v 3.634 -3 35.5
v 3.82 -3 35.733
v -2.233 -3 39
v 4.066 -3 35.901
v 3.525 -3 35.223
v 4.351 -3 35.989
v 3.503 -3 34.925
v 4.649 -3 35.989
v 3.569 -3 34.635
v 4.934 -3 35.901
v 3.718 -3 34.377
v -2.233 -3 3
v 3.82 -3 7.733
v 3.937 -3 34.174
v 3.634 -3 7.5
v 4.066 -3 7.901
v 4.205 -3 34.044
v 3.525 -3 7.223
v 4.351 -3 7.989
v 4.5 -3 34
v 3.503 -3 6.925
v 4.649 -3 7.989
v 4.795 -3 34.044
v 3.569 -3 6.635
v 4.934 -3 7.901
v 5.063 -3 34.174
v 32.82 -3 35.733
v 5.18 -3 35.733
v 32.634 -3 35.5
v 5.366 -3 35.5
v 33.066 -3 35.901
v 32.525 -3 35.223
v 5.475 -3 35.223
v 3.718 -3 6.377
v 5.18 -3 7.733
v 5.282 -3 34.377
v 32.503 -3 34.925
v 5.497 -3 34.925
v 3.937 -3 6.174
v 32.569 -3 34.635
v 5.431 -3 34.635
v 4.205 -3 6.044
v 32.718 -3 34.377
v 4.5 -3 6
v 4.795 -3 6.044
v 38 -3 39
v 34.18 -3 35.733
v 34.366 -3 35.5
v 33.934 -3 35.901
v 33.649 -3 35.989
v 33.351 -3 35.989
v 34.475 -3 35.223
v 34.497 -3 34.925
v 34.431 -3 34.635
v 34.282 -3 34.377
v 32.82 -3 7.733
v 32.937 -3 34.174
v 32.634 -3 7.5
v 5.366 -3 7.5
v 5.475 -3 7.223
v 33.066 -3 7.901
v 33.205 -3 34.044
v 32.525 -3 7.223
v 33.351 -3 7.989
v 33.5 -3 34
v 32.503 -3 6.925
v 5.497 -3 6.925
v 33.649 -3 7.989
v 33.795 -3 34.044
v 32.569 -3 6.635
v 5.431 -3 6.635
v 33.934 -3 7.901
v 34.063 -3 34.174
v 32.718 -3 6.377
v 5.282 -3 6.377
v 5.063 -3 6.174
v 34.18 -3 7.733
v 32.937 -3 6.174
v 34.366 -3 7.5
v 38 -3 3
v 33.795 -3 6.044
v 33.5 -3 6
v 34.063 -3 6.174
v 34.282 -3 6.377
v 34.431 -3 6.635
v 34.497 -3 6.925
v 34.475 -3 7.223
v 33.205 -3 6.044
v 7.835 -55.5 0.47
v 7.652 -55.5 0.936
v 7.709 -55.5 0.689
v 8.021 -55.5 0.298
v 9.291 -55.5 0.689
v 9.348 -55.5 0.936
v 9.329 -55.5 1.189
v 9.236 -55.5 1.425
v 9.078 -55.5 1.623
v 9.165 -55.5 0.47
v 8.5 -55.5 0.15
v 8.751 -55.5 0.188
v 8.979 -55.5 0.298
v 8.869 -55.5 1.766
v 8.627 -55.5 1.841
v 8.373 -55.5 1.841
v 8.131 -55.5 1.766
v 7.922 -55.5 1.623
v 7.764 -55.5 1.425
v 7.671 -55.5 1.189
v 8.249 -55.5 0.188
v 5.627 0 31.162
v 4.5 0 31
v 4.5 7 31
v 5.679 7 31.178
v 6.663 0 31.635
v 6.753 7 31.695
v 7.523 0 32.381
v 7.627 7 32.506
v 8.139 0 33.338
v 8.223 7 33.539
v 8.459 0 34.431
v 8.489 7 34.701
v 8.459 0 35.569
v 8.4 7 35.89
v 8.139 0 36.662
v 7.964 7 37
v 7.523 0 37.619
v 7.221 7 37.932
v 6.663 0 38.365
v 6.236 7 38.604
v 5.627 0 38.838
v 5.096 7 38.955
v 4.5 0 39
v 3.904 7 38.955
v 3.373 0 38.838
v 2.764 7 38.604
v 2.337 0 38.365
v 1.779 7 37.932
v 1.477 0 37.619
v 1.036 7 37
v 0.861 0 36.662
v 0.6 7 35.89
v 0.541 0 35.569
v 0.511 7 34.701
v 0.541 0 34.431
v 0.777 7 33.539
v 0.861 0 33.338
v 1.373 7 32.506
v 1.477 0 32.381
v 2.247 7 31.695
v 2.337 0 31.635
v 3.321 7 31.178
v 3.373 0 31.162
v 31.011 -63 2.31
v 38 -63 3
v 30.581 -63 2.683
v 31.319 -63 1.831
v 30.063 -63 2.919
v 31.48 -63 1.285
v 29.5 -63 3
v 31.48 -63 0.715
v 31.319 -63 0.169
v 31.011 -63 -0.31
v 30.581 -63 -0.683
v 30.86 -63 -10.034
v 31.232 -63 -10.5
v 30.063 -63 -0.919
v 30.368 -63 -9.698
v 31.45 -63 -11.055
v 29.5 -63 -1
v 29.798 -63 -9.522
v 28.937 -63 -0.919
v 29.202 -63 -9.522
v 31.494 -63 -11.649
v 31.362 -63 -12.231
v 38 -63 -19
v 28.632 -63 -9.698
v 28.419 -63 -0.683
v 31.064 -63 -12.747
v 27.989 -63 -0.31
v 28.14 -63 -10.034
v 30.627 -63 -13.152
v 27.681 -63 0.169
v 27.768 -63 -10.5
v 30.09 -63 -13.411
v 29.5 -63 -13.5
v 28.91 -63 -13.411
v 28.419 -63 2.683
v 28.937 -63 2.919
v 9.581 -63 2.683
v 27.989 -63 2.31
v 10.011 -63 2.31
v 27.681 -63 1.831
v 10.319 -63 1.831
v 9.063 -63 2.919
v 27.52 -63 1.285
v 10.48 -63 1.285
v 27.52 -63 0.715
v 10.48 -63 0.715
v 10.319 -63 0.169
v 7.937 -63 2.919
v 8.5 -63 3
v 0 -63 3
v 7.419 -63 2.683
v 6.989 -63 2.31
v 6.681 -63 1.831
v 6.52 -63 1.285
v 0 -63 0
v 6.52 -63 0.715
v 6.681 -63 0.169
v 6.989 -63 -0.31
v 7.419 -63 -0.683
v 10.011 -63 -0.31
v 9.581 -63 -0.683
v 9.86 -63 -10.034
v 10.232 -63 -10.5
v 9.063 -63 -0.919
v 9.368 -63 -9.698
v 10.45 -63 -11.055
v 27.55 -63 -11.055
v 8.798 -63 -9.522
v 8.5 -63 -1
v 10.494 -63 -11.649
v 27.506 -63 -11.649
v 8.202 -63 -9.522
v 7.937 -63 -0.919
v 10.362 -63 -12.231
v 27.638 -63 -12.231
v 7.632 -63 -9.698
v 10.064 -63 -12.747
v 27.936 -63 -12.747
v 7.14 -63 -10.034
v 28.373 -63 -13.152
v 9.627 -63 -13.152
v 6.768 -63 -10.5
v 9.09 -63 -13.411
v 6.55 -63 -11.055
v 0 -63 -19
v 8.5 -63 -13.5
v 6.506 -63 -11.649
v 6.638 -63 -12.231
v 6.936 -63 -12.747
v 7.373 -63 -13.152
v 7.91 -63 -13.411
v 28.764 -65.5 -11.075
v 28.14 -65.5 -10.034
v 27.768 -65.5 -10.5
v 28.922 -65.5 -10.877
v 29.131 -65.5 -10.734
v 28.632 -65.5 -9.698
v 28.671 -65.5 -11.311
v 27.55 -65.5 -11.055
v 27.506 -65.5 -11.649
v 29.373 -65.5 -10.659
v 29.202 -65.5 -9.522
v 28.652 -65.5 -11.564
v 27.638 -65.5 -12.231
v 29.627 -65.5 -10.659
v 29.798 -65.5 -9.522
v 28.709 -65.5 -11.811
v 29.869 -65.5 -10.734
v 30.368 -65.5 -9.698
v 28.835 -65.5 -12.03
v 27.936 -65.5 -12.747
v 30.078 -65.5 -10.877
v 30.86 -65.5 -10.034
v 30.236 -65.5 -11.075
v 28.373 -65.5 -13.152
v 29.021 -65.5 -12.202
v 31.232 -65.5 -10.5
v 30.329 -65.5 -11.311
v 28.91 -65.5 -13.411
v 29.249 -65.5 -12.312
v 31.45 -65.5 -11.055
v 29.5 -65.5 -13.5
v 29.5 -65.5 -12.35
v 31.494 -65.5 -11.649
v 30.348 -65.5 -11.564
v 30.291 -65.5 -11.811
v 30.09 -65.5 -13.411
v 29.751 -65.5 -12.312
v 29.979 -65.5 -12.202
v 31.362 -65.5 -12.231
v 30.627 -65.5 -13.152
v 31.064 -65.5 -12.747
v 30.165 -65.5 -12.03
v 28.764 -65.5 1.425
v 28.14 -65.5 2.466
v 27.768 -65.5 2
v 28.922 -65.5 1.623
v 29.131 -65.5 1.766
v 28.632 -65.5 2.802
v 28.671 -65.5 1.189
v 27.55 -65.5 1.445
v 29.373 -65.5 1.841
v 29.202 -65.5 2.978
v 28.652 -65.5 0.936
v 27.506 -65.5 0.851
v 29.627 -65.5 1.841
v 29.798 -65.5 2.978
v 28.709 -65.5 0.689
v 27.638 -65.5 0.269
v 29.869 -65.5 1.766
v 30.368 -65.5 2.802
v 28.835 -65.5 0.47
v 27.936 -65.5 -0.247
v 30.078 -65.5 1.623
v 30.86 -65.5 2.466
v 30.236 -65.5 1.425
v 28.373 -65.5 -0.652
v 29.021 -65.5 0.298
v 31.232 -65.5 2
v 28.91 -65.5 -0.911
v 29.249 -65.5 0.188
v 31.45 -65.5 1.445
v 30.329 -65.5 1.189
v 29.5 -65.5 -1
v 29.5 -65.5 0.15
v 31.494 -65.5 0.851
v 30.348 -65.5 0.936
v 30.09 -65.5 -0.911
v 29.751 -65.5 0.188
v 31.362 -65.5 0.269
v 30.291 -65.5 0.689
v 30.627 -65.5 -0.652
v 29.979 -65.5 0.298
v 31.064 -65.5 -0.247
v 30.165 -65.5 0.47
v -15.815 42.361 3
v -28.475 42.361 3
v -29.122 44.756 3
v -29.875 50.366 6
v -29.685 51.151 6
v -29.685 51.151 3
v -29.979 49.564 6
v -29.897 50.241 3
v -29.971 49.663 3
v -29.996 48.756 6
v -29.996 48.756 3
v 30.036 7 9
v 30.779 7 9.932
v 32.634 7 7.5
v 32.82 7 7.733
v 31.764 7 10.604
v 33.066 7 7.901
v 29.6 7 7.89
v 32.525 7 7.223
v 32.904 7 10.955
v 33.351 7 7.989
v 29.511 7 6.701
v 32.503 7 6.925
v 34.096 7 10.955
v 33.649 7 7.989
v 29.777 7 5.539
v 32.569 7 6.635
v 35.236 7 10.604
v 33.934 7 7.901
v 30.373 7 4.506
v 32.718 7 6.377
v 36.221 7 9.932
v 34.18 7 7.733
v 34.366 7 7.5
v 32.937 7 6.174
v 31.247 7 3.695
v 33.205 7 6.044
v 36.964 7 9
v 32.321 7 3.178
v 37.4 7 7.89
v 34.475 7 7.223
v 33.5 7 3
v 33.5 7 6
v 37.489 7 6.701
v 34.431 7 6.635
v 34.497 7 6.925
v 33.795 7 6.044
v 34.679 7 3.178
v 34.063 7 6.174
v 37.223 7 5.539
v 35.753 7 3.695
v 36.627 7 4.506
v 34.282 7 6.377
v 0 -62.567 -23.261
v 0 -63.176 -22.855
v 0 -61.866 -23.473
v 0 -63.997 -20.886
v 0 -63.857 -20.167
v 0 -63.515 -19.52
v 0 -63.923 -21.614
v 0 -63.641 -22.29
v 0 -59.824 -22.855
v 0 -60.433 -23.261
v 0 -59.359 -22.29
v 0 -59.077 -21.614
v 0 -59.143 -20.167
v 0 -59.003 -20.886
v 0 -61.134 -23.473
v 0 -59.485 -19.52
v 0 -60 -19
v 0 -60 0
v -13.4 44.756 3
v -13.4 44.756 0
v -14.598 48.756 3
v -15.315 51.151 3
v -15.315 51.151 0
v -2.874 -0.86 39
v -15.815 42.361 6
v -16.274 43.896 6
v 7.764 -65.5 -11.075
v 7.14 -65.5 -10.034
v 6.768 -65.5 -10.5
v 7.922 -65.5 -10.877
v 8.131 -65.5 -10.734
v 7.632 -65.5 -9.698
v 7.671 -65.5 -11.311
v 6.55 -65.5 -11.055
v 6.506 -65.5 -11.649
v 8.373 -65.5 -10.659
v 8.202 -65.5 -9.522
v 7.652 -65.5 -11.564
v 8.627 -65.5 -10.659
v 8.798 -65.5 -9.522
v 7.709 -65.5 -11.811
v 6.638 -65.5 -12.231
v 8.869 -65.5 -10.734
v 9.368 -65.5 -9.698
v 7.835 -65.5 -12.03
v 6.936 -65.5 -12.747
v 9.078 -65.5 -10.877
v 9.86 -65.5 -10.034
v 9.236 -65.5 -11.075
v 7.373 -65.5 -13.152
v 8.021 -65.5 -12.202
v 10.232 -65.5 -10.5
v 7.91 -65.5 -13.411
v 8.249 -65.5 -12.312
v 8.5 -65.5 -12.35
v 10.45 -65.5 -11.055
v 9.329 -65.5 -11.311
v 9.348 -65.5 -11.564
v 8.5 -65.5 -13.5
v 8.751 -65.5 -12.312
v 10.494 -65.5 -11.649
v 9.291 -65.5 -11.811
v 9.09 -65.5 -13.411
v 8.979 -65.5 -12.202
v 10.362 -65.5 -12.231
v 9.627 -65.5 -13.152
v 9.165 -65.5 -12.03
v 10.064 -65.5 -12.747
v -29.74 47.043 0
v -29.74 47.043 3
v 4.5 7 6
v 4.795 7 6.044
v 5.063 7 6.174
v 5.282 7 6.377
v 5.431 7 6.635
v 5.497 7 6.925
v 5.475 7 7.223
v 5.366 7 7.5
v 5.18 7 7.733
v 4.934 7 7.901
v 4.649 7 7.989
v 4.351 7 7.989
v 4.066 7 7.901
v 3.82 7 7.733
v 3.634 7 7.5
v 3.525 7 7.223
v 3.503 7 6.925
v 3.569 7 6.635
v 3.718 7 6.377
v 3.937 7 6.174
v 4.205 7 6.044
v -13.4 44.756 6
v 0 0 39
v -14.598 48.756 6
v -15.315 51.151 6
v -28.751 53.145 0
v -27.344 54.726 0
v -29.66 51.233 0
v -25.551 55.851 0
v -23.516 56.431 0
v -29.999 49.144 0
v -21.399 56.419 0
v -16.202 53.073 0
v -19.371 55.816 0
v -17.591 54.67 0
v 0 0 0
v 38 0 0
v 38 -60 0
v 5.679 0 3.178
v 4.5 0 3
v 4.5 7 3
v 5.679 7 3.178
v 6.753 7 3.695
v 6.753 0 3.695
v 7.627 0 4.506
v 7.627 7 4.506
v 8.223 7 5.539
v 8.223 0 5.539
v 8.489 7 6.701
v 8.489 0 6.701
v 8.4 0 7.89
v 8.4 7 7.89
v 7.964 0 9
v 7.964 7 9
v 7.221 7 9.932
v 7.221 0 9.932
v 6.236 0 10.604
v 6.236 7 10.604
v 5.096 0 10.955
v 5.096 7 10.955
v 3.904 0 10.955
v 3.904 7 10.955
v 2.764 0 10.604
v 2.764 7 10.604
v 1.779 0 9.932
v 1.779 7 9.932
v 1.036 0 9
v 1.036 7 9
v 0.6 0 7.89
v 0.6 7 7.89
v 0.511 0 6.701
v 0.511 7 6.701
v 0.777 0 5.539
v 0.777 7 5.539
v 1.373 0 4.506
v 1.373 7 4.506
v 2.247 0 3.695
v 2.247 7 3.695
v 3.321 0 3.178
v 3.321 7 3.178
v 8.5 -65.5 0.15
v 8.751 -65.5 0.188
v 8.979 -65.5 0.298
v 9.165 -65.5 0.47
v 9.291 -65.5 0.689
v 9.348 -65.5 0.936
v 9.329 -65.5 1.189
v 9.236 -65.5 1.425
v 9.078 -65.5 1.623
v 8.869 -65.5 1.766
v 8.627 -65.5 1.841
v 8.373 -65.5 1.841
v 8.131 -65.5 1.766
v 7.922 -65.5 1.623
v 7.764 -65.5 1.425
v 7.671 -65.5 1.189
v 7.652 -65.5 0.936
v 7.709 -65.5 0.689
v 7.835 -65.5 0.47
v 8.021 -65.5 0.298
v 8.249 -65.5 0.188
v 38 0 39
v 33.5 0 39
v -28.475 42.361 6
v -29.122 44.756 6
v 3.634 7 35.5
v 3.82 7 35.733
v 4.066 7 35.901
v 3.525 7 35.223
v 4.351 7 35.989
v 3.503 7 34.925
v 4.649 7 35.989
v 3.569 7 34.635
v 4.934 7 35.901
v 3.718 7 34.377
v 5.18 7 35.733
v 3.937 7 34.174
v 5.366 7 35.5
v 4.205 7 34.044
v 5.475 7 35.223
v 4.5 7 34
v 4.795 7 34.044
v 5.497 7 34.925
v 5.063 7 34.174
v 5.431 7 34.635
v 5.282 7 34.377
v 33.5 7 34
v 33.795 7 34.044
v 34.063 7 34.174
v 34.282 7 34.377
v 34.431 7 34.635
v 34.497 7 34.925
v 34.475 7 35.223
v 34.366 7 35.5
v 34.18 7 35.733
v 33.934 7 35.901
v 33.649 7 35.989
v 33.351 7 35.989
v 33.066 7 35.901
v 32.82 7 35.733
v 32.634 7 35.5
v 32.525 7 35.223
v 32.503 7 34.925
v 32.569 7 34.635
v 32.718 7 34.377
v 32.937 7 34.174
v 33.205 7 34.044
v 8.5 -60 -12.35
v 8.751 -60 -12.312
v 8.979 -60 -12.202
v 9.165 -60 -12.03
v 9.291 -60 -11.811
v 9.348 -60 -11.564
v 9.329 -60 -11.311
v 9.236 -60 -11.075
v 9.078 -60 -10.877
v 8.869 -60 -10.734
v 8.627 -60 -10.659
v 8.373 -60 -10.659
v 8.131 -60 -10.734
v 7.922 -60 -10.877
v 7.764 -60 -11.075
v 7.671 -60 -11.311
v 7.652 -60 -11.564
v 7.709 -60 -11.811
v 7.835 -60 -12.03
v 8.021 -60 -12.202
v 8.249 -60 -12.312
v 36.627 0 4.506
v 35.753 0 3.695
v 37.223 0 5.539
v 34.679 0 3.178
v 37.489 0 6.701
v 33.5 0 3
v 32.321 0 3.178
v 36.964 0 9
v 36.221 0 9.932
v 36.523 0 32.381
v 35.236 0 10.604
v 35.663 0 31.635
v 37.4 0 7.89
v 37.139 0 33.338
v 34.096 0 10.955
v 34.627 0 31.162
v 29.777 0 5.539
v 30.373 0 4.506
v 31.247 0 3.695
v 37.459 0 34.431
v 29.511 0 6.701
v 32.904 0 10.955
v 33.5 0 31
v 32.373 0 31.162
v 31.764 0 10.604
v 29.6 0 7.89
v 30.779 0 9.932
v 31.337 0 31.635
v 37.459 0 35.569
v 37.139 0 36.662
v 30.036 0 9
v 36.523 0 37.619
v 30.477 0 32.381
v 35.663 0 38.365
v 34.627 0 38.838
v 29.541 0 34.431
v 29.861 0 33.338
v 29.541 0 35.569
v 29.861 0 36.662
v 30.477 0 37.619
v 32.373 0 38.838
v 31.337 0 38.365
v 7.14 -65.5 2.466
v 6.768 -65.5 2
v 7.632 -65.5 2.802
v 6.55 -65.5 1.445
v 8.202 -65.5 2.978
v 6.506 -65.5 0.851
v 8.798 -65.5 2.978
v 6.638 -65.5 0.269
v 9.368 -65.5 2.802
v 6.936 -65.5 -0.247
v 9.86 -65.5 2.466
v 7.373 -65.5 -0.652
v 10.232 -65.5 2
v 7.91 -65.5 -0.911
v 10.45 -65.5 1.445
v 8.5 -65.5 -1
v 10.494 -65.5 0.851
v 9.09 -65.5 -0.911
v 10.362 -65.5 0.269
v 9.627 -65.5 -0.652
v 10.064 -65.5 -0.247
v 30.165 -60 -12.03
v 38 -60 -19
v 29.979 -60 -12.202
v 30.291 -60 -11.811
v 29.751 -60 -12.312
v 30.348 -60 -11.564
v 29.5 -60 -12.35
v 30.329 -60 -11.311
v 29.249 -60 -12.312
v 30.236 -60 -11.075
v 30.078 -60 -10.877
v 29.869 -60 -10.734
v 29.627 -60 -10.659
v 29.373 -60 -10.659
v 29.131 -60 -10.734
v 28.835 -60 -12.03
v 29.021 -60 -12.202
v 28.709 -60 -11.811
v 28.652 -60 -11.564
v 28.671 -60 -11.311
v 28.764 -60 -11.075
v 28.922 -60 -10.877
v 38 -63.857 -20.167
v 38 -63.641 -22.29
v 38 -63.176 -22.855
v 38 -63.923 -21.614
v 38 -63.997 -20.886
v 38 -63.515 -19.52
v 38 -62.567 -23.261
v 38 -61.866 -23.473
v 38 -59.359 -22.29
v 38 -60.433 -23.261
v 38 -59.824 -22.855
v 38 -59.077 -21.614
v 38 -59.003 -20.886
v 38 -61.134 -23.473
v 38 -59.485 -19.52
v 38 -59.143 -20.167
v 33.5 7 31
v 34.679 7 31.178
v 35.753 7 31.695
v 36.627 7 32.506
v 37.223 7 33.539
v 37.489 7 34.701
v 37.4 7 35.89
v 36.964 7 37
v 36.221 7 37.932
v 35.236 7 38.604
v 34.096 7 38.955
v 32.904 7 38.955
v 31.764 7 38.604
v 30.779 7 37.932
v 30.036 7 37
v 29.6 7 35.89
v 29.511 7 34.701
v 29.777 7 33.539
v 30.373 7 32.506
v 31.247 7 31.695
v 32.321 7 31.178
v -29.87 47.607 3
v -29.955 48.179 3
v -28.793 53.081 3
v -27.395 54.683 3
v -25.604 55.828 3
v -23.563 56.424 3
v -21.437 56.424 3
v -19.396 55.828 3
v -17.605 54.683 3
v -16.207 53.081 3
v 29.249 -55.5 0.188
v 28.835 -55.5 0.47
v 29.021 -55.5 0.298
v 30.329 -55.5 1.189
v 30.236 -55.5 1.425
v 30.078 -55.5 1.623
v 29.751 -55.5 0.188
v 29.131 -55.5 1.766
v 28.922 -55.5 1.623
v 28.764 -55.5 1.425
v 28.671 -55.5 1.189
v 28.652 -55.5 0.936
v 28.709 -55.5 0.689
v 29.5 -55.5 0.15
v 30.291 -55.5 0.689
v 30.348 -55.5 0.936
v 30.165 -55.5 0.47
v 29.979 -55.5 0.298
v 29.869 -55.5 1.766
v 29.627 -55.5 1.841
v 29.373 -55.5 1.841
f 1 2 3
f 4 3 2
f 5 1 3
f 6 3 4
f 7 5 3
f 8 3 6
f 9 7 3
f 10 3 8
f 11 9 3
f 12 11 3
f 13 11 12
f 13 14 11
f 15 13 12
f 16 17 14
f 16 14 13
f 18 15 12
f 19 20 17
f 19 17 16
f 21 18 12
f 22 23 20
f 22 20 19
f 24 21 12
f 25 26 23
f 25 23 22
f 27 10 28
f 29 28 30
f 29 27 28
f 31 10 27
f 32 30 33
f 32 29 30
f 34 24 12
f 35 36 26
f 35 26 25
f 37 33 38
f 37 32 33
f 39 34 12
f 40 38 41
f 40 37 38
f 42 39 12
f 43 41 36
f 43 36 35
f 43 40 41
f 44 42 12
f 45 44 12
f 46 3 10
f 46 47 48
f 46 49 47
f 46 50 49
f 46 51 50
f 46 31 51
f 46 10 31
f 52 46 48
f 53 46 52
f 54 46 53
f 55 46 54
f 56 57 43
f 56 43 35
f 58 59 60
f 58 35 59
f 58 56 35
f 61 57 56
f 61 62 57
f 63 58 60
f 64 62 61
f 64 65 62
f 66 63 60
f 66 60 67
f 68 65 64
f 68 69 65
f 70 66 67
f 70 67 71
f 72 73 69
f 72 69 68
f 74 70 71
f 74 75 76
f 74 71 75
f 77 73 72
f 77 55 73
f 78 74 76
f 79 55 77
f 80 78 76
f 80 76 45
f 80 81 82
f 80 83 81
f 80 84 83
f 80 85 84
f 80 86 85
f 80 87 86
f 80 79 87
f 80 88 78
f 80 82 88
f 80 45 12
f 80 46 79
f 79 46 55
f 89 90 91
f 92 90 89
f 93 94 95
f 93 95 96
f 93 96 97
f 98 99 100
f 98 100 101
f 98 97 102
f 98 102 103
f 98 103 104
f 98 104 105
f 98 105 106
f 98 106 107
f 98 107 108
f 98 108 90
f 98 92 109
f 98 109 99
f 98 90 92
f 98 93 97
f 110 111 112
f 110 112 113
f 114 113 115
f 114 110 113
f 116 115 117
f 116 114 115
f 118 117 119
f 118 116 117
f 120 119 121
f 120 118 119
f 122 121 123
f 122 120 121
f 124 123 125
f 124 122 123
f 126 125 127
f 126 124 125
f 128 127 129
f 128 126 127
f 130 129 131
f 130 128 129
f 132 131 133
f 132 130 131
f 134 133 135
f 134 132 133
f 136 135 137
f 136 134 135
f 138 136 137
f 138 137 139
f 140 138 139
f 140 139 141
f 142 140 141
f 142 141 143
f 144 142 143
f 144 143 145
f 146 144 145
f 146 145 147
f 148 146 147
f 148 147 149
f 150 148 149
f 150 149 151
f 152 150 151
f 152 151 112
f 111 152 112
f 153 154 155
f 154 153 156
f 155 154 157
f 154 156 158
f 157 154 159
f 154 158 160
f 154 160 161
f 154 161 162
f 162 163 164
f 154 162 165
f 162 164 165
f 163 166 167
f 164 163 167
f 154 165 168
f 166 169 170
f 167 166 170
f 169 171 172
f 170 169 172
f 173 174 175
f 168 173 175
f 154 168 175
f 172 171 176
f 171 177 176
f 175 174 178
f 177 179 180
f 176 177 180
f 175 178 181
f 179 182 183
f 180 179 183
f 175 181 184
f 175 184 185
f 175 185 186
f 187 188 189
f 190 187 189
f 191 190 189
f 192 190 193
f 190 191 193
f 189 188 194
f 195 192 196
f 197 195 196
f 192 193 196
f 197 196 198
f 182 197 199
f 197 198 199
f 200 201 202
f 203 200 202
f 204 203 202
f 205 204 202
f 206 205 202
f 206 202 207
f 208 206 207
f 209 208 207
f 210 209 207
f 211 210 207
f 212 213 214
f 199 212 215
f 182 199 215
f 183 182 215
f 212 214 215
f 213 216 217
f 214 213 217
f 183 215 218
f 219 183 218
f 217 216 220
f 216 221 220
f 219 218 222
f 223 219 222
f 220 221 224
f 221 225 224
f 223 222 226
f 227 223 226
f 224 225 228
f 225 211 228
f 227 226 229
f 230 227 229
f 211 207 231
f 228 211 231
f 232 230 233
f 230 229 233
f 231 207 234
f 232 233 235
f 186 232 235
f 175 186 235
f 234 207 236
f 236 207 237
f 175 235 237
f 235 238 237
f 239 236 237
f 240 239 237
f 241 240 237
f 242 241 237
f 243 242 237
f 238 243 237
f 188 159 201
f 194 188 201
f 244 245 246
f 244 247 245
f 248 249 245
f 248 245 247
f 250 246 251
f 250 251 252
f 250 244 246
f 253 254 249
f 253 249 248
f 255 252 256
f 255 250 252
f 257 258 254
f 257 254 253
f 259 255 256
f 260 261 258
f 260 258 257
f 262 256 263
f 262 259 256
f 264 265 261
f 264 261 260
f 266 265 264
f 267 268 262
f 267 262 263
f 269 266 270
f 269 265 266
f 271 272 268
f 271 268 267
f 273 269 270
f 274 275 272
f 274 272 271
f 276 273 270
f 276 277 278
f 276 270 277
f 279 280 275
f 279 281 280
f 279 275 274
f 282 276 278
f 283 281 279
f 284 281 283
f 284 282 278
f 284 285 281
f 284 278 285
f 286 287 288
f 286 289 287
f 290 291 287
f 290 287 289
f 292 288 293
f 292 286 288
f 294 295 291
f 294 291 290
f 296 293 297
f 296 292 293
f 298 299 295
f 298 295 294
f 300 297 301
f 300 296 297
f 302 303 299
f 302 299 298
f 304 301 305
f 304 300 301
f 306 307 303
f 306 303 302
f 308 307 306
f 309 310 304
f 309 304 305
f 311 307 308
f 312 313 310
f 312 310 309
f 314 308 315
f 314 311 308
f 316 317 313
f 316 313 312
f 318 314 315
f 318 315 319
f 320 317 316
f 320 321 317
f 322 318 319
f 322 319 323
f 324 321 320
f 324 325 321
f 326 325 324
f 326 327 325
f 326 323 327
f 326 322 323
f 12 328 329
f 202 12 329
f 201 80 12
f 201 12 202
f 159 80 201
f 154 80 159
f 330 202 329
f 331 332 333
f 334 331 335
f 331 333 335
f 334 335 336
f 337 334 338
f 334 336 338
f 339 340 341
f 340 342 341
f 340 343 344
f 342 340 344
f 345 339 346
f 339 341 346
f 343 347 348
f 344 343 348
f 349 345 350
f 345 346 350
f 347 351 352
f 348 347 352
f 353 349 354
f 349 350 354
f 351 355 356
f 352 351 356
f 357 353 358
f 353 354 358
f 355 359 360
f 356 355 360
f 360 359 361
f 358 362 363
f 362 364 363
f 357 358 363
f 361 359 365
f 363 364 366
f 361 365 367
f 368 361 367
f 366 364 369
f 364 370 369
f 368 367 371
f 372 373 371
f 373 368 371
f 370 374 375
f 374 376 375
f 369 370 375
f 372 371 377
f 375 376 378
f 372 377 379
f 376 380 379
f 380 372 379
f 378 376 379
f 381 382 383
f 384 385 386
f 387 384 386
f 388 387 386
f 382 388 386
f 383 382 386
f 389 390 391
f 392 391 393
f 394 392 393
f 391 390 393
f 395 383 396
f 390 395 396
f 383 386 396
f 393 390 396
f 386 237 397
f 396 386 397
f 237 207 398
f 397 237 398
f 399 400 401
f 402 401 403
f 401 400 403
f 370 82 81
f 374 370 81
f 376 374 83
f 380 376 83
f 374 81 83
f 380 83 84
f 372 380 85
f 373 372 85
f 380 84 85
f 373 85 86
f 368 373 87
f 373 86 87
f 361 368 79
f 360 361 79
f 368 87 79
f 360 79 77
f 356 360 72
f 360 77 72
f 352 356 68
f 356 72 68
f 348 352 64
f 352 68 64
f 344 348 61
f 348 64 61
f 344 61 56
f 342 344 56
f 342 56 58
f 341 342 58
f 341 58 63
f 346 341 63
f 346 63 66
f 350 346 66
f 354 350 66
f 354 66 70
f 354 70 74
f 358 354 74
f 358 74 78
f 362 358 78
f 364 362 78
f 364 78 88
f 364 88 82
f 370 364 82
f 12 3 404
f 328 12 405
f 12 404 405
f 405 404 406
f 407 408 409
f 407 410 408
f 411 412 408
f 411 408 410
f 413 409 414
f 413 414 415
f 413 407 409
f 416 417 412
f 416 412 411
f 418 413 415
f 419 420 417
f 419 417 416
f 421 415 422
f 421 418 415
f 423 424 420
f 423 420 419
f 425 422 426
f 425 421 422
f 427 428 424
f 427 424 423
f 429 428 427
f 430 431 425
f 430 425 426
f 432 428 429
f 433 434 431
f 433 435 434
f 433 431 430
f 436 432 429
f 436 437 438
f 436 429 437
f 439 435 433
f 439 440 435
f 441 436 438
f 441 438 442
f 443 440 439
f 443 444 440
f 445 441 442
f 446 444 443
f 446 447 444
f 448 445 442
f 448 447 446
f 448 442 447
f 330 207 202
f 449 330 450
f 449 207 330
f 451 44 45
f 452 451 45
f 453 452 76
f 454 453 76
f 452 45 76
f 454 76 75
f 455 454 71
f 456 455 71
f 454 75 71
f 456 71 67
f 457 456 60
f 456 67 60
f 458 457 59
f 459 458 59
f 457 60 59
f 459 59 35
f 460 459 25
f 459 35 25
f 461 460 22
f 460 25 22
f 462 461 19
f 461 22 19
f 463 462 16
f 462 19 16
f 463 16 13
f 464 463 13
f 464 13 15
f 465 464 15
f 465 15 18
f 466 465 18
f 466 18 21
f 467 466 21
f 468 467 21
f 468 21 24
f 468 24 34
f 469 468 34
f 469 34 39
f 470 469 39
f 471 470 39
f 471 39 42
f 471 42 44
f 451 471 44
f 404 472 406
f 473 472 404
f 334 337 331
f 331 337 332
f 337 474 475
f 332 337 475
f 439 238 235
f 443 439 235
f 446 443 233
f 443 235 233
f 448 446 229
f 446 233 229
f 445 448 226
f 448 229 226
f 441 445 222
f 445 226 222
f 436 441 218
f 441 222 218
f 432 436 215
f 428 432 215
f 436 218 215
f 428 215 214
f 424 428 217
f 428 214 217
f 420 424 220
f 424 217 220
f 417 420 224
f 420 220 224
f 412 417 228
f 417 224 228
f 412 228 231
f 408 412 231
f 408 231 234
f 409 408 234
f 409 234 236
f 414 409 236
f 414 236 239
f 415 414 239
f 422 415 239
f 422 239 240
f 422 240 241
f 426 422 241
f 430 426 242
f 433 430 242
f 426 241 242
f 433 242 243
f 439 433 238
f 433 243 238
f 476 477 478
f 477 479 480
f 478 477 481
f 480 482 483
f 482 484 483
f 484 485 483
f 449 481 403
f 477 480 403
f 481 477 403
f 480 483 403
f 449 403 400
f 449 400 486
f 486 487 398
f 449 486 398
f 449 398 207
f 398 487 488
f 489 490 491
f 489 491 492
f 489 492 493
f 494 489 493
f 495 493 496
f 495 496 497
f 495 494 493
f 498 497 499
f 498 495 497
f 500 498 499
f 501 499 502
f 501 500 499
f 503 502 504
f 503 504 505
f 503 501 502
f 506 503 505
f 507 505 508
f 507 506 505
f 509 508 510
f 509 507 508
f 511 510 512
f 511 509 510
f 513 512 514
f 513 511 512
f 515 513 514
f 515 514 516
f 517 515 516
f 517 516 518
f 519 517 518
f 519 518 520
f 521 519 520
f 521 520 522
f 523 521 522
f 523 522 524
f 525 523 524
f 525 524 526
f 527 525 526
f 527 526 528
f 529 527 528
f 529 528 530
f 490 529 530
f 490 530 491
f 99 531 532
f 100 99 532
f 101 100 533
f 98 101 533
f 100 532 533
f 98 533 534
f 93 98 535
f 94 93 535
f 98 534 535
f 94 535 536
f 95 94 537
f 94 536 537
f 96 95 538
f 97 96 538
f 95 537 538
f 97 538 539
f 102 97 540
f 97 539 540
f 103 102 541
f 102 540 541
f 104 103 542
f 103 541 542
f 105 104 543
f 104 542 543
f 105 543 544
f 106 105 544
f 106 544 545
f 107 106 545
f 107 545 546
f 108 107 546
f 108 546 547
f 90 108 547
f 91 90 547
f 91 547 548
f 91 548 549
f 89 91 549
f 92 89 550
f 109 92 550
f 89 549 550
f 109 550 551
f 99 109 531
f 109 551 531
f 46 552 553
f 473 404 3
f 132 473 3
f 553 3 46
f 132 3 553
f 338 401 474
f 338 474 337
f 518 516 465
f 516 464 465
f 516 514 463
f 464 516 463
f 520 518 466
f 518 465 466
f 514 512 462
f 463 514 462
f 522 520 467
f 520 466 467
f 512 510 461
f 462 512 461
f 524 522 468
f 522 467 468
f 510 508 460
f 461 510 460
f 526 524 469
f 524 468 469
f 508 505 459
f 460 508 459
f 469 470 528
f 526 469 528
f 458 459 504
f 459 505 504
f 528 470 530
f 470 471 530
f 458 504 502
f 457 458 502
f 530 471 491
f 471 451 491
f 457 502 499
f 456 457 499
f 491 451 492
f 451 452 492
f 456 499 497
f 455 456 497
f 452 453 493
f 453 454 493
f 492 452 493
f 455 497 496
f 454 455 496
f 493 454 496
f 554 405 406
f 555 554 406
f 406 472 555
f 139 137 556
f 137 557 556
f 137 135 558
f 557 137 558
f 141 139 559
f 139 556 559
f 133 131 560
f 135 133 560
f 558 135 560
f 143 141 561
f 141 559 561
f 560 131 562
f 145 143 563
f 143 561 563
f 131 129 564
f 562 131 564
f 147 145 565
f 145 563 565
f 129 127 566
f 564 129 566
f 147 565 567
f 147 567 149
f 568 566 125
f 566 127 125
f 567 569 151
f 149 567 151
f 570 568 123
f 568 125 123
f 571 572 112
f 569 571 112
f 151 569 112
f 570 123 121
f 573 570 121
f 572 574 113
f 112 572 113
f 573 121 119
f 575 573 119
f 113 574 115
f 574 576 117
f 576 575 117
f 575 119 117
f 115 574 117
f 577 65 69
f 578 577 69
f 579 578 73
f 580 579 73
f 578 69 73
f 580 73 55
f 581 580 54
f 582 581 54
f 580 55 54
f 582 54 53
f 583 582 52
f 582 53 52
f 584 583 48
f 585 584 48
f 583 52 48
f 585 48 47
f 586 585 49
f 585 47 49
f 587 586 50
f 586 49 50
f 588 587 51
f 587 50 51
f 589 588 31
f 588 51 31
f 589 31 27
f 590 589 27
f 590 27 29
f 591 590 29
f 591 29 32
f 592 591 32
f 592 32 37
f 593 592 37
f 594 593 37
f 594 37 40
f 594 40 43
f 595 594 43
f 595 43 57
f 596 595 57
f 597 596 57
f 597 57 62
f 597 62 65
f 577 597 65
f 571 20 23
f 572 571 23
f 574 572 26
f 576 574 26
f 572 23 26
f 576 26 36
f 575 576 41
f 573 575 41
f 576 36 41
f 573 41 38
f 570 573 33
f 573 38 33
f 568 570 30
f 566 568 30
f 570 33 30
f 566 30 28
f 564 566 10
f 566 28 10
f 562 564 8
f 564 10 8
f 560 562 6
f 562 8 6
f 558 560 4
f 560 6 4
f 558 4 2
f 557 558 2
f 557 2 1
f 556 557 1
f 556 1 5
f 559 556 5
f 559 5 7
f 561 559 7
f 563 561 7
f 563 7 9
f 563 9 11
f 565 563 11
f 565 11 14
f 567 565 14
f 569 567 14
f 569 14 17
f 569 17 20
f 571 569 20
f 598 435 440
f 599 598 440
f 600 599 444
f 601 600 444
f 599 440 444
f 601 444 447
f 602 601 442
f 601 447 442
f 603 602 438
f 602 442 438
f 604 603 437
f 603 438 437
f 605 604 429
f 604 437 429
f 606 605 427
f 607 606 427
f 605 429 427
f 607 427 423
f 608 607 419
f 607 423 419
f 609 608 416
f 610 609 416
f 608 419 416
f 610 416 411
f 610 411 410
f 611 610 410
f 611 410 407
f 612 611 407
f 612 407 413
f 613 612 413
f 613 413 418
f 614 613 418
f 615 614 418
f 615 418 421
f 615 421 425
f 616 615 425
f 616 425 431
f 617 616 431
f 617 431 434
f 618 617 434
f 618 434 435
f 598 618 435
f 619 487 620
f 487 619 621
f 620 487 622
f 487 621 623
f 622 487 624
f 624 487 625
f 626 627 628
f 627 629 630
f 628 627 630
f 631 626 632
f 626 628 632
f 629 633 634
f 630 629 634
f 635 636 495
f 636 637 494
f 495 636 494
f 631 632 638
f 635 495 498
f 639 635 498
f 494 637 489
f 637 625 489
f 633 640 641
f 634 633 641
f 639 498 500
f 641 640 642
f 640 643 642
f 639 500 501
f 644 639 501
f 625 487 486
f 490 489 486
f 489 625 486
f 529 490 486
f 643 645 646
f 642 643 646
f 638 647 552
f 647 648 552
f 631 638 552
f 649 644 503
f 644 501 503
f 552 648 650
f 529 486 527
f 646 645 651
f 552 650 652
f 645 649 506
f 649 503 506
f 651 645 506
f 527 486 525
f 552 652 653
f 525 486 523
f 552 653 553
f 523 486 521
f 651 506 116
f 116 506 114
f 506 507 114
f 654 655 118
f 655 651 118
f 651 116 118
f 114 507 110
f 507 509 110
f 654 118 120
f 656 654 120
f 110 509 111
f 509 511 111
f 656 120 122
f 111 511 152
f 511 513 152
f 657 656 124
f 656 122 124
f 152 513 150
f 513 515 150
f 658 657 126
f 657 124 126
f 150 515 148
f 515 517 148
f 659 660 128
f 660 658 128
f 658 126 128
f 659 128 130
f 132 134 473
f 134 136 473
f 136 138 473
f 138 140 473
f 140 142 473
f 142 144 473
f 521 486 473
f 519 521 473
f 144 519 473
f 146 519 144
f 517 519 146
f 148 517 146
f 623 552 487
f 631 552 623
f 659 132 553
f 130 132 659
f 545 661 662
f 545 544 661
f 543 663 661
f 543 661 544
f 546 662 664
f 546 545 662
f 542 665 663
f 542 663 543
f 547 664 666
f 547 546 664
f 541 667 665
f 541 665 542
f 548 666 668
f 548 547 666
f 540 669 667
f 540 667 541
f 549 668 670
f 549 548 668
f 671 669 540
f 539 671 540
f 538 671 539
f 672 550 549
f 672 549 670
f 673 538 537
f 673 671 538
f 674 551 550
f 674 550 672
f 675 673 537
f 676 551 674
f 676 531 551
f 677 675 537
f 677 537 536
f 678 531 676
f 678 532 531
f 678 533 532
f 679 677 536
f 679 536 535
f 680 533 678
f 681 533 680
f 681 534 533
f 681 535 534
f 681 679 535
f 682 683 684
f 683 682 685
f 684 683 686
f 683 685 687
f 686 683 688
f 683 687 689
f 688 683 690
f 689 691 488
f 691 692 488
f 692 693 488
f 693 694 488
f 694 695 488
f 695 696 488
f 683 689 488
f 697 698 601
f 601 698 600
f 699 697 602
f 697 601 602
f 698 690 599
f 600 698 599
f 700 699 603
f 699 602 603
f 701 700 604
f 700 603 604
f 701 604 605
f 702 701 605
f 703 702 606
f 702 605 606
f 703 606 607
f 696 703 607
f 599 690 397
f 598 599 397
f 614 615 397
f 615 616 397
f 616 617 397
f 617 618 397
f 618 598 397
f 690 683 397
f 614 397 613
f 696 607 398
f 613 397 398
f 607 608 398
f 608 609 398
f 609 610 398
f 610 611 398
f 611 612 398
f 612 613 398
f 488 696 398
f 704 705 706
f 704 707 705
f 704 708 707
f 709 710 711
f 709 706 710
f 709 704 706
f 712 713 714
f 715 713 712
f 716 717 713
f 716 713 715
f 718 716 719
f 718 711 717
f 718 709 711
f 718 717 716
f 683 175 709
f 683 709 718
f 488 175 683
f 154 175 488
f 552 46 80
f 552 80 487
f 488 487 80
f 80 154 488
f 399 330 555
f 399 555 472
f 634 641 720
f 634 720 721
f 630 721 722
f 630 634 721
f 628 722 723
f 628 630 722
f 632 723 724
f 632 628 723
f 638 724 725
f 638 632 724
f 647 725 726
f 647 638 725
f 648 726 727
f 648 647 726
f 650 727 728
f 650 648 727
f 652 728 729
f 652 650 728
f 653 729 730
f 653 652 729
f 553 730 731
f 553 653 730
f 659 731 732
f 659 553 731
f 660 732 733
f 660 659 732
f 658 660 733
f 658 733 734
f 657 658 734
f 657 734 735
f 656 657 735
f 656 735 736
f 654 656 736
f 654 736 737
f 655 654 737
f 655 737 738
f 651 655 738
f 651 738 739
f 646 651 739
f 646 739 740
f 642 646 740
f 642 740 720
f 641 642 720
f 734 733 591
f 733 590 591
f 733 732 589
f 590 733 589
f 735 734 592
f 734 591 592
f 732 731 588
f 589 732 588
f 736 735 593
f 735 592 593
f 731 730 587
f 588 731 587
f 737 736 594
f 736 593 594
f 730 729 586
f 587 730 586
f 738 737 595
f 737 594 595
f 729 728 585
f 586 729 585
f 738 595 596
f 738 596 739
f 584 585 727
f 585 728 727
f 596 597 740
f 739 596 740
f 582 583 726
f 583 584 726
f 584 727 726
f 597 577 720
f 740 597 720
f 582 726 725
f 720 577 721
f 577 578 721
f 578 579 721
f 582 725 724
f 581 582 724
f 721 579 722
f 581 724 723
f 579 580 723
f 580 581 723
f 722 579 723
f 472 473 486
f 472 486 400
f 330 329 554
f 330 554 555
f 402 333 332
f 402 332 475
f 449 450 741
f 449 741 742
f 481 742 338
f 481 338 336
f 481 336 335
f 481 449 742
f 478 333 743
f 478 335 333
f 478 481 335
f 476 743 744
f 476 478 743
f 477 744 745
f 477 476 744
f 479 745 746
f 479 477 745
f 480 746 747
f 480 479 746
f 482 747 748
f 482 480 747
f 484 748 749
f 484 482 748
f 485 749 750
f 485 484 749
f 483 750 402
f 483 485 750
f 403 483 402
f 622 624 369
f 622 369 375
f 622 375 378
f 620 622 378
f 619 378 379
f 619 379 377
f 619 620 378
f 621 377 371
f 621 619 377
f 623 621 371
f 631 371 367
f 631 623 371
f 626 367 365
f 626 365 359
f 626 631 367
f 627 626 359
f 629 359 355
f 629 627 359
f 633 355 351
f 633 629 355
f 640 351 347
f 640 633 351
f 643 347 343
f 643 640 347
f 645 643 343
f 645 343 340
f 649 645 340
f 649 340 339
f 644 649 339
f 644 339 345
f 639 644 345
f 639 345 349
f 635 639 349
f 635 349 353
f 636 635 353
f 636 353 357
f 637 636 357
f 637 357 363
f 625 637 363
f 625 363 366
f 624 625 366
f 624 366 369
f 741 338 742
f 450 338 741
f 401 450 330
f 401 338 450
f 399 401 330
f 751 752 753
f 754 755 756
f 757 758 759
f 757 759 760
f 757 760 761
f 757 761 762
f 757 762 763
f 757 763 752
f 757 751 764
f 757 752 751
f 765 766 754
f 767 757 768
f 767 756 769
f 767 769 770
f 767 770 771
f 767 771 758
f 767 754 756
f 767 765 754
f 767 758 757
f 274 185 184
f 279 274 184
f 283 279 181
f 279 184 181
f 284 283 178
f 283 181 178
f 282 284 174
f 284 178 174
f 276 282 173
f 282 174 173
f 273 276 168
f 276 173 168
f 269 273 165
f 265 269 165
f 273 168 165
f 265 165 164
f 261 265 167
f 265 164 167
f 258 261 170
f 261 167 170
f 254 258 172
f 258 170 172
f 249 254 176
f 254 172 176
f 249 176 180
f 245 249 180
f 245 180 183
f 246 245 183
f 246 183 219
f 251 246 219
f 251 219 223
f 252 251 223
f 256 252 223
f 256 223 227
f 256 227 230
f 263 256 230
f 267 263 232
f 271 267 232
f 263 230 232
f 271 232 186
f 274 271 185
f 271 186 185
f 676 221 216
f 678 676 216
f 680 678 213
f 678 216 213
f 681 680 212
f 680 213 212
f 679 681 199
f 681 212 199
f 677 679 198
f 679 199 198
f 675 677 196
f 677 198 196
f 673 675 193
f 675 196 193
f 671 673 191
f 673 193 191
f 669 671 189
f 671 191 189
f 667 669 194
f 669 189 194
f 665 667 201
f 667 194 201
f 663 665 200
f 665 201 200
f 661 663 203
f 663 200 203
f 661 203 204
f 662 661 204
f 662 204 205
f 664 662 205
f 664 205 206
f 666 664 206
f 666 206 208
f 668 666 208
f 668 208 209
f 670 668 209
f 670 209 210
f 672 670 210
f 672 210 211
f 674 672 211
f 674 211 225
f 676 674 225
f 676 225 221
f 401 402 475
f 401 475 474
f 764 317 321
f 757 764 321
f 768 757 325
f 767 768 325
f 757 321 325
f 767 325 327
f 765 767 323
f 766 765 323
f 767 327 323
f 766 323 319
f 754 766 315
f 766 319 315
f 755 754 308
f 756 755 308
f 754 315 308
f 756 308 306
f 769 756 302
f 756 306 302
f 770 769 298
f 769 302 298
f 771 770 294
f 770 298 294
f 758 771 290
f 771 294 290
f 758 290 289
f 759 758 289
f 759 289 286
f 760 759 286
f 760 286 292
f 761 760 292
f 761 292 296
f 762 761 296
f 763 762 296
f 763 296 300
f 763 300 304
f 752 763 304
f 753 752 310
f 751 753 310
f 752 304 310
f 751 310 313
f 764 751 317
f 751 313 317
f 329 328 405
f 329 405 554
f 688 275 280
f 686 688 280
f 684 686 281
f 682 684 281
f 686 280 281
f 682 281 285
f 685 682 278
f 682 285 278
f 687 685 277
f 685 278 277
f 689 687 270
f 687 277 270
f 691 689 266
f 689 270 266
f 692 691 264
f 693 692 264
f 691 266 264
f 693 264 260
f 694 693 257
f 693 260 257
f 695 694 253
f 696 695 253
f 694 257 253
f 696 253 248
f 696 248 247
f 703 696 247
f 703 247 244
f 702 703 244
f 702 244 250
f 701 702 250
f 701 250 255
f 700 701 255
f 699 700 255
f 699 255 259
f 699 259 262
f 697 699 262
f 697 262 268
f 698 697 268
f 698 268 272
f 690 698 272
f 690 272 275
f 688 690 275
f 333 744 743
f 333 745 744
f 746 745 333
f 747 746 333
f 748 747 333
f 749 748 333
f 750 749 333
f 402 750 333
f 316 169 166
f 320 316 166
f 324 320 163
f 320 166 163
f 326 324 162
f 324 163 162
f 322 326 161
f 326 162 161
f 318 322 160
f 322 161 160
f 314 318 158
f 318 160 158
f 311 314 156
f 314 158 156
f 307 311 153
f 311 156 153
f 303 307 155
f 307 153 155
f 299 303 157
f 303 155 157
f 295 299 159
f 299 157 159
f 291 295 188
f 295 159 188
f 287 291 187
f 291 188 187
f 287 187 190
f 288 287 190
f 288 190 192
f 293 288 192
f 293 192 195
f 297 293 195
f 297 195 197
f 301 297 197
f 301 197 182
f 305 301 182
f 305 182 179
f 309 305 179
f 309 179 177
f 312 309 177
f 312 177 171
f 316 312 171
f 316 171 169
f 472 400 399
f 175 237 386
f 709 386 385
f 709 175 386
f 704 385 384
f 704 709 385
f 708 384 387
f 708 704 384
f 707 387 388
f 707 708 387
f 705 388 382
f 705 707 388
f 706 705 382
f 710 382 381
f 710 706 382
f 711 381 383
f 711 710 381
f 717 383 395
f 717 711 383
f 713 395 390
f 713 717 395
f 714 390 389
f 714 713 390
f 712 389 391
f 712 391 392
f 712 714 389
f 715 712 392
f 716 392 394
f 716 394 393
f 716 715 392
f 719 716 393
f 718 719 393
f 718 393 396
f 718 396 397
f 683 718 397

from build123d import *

# Parameters (mm, degrees)
PAD_DEPTH       = 38
SKETCH001_R     = 2.5
PAD001_DEPTH    = 38
SKETCH002_R     = 2
PAD002_DEPTH    = 2.5
SKETCH003_R     = 0.85
POCKET_DEPTH    = 10
SKETCH004_R     = 4
PAD003_DEPTH    = 10
SKETCH005_R     = 1
POCKET001_DEPTH = 10.001
PAD004_DEPTH    = 3
PAD005_DEPTH    = 3
PAD006_DEPTH    = 3
SKETCH009_W     = 60
SKETCH009_H     = 36
POCKET002_DEPTH = 68.001


with BuildPart() as part:
    # Sketch → Pad (new body)
    with BuildSketch(Plane.YZ):
        Polygon((-63, 3), (-63, -23), (-60, -23), (-60, 0), (0, 0), (0, 39), (-3, 39), (-3, 3), align=None)
    extrude(amount=PAD_DEPTH)

    # Sketch001 (on Face10 of Pad) → Pad001 (new body)
    with BuildSketch(Plane.YZ.offset(38)):
        with Locations((-61.5, -21)):
            Circle(SKETCH001_R)
    extrude(amount=-PAD001_DEPTH)

    # Sketch002 (on Face3 of Pad001) → Pad002 (new body)
    with BuildSketch(Plane(origin=(0, -63, 0), x_dir=(0, 0, -1), z_dir=(0, -1, 0))):
        with Locations((-1, 29.5)):
            Circle(SKETCH002_R)
        with Locations((-1, 8.5)):
            Circle(SKETCH002_R)
        with Locations((11.5, 8.5)):
            Circle(SKETCH002_R)
        with Locations((11.5, 29.5)):
            Circle(SKETCH002_R)
    extrude(amount=PAD002_DEPTH)

    # Sketch003 (on Face25 of Pad002) → Pocket (cut)
    with BuildSketch(Plane(origin=(0, -65.5, 0), x_dir=(0, 0, -1), z_dir=(0, -1, 0))):
        with Locations((11.5, 29.5)):
            Circle(SKETCH003_R)
        with Locations((11.5, 8.5)):
            Circle(SKETCH003_R)
        with Locations((-1, 29.5)):
            Circle(SKETCH003_R)
        with Locations((-1, 8.5)):
            Circle(SKETCH003_R)
    extrude(amount=-POCKET_DEPTH, mode=Mode.SUBTRACT)

    # Sketch004 (on Face1 of Pocket) → Pad003 (new body)
    with BuildSketch(Plane(origin=(0, -3, 0), x_dir=(0, 0, -1), z_dir=(0, -1, 0))):
        with Locations((-7, 33.5)):
            Circle(SKETCH004_R)
        with Locations((-7, 4.5)):
            Circle(SKETCH004_R)
        with Locations((-35, 33.5)):
            Circle(SKETCH004_R)
        with Locations((-35, 4.5)):
            Circle(SKETCH004_R)
    extrude(amount=-PAD003_DEPTH)

    # Sketch005 (on Face29 of Pad003) → Pocket001 (cut, through all)
    with BuildSketch(Plane(origin=(0, -3, 0), x_dir=(0, 0, -1), z_dir=(0, -1, 0))):
        with Locations((-35, 33.5)):
            Circle(SKETCH005_R)
        with Locations((-7, 33.5)):
            Circle(SKETCH005_R)
        with Locations((-7, 4.5)):
            Circle(SKETCH005_R)
        with Locations((-35, 4.5)):
            Circle(SKETCH005_R)
    extrude(amount=-POCKET001_DEPTH, mode=Mode.SUBTRACT)

    # Sketch006 (on Face5 of Pocket001) → Pad004 (new body)
    with BuildSketch(Plane.YX):
        with BuildLine():
            Line((0, 0), (51.151245, -15.315145))
            ThreePointArc((47.04327, -29.740249), (56.213208, -24.554175), (51.151245, -15.315145))
            Line((-63, 0), (47.04327, -29.740249))
            Line((-63, 0), (0, 0))
        make_face()
    extrude(amount=-PAD004_DEPTH)

    # Sketch007 (on Face28 of Pad004) → Pad005 (new body)
    with BuildSketch(Plane(origin=(0, 0, 3), x_dir=(0, -1, 0), z_dir=(0, 0, 1))):
        with BuildLine():
            Line((-51.151245, -15.315145), (-48.756291, -14.598074))
            Line((-48.756291, -14.598074), (-48.756291, -29.996039))
            ThreePointArc((-51.151245, -29.684855), (-49.966376, -29.937481), (-48.756291, -29.996039))
            Line((-51.151245, -29.684855), (-51.151245, -15.315145))
        make_face()
        Polygon((-44.756291, -13.400438), (-42.361336, -12.683367), (-42.361336, -28.474911), (-44.756291, -29.122171), align=None)
    extrude(amount=PAD005_DEPTH)

    # Sketch008 (on Face38 of Pad005) → Pad006 (new body)
    with BuildSketch(Plane(origin=(0, 0, 0), x_dir=(-0.286828, 0.957982, 0), z_dir=(0.957982, 0.286828, 0))):
        Polygon((-2.873946, 0), (46.719346, 0), (46.719346, 6), (0, 39), (-2.873946, 39), align=None)
    extrude(amount=-PAD006_DEPTH)

    # Sketch009 (on Face11 of Pad006) → Pocket002 (cut, through all)
    with BuildSketch(Plane.YZ.offset(38)):
        with Locations((-33, 21)):
            Rectangle(SKETCH009_W, SKETCH009_H)
    extrude(amount=-POCKET002_DEPTH, mode=Mode.SUBTRACT)


solid = part.part
